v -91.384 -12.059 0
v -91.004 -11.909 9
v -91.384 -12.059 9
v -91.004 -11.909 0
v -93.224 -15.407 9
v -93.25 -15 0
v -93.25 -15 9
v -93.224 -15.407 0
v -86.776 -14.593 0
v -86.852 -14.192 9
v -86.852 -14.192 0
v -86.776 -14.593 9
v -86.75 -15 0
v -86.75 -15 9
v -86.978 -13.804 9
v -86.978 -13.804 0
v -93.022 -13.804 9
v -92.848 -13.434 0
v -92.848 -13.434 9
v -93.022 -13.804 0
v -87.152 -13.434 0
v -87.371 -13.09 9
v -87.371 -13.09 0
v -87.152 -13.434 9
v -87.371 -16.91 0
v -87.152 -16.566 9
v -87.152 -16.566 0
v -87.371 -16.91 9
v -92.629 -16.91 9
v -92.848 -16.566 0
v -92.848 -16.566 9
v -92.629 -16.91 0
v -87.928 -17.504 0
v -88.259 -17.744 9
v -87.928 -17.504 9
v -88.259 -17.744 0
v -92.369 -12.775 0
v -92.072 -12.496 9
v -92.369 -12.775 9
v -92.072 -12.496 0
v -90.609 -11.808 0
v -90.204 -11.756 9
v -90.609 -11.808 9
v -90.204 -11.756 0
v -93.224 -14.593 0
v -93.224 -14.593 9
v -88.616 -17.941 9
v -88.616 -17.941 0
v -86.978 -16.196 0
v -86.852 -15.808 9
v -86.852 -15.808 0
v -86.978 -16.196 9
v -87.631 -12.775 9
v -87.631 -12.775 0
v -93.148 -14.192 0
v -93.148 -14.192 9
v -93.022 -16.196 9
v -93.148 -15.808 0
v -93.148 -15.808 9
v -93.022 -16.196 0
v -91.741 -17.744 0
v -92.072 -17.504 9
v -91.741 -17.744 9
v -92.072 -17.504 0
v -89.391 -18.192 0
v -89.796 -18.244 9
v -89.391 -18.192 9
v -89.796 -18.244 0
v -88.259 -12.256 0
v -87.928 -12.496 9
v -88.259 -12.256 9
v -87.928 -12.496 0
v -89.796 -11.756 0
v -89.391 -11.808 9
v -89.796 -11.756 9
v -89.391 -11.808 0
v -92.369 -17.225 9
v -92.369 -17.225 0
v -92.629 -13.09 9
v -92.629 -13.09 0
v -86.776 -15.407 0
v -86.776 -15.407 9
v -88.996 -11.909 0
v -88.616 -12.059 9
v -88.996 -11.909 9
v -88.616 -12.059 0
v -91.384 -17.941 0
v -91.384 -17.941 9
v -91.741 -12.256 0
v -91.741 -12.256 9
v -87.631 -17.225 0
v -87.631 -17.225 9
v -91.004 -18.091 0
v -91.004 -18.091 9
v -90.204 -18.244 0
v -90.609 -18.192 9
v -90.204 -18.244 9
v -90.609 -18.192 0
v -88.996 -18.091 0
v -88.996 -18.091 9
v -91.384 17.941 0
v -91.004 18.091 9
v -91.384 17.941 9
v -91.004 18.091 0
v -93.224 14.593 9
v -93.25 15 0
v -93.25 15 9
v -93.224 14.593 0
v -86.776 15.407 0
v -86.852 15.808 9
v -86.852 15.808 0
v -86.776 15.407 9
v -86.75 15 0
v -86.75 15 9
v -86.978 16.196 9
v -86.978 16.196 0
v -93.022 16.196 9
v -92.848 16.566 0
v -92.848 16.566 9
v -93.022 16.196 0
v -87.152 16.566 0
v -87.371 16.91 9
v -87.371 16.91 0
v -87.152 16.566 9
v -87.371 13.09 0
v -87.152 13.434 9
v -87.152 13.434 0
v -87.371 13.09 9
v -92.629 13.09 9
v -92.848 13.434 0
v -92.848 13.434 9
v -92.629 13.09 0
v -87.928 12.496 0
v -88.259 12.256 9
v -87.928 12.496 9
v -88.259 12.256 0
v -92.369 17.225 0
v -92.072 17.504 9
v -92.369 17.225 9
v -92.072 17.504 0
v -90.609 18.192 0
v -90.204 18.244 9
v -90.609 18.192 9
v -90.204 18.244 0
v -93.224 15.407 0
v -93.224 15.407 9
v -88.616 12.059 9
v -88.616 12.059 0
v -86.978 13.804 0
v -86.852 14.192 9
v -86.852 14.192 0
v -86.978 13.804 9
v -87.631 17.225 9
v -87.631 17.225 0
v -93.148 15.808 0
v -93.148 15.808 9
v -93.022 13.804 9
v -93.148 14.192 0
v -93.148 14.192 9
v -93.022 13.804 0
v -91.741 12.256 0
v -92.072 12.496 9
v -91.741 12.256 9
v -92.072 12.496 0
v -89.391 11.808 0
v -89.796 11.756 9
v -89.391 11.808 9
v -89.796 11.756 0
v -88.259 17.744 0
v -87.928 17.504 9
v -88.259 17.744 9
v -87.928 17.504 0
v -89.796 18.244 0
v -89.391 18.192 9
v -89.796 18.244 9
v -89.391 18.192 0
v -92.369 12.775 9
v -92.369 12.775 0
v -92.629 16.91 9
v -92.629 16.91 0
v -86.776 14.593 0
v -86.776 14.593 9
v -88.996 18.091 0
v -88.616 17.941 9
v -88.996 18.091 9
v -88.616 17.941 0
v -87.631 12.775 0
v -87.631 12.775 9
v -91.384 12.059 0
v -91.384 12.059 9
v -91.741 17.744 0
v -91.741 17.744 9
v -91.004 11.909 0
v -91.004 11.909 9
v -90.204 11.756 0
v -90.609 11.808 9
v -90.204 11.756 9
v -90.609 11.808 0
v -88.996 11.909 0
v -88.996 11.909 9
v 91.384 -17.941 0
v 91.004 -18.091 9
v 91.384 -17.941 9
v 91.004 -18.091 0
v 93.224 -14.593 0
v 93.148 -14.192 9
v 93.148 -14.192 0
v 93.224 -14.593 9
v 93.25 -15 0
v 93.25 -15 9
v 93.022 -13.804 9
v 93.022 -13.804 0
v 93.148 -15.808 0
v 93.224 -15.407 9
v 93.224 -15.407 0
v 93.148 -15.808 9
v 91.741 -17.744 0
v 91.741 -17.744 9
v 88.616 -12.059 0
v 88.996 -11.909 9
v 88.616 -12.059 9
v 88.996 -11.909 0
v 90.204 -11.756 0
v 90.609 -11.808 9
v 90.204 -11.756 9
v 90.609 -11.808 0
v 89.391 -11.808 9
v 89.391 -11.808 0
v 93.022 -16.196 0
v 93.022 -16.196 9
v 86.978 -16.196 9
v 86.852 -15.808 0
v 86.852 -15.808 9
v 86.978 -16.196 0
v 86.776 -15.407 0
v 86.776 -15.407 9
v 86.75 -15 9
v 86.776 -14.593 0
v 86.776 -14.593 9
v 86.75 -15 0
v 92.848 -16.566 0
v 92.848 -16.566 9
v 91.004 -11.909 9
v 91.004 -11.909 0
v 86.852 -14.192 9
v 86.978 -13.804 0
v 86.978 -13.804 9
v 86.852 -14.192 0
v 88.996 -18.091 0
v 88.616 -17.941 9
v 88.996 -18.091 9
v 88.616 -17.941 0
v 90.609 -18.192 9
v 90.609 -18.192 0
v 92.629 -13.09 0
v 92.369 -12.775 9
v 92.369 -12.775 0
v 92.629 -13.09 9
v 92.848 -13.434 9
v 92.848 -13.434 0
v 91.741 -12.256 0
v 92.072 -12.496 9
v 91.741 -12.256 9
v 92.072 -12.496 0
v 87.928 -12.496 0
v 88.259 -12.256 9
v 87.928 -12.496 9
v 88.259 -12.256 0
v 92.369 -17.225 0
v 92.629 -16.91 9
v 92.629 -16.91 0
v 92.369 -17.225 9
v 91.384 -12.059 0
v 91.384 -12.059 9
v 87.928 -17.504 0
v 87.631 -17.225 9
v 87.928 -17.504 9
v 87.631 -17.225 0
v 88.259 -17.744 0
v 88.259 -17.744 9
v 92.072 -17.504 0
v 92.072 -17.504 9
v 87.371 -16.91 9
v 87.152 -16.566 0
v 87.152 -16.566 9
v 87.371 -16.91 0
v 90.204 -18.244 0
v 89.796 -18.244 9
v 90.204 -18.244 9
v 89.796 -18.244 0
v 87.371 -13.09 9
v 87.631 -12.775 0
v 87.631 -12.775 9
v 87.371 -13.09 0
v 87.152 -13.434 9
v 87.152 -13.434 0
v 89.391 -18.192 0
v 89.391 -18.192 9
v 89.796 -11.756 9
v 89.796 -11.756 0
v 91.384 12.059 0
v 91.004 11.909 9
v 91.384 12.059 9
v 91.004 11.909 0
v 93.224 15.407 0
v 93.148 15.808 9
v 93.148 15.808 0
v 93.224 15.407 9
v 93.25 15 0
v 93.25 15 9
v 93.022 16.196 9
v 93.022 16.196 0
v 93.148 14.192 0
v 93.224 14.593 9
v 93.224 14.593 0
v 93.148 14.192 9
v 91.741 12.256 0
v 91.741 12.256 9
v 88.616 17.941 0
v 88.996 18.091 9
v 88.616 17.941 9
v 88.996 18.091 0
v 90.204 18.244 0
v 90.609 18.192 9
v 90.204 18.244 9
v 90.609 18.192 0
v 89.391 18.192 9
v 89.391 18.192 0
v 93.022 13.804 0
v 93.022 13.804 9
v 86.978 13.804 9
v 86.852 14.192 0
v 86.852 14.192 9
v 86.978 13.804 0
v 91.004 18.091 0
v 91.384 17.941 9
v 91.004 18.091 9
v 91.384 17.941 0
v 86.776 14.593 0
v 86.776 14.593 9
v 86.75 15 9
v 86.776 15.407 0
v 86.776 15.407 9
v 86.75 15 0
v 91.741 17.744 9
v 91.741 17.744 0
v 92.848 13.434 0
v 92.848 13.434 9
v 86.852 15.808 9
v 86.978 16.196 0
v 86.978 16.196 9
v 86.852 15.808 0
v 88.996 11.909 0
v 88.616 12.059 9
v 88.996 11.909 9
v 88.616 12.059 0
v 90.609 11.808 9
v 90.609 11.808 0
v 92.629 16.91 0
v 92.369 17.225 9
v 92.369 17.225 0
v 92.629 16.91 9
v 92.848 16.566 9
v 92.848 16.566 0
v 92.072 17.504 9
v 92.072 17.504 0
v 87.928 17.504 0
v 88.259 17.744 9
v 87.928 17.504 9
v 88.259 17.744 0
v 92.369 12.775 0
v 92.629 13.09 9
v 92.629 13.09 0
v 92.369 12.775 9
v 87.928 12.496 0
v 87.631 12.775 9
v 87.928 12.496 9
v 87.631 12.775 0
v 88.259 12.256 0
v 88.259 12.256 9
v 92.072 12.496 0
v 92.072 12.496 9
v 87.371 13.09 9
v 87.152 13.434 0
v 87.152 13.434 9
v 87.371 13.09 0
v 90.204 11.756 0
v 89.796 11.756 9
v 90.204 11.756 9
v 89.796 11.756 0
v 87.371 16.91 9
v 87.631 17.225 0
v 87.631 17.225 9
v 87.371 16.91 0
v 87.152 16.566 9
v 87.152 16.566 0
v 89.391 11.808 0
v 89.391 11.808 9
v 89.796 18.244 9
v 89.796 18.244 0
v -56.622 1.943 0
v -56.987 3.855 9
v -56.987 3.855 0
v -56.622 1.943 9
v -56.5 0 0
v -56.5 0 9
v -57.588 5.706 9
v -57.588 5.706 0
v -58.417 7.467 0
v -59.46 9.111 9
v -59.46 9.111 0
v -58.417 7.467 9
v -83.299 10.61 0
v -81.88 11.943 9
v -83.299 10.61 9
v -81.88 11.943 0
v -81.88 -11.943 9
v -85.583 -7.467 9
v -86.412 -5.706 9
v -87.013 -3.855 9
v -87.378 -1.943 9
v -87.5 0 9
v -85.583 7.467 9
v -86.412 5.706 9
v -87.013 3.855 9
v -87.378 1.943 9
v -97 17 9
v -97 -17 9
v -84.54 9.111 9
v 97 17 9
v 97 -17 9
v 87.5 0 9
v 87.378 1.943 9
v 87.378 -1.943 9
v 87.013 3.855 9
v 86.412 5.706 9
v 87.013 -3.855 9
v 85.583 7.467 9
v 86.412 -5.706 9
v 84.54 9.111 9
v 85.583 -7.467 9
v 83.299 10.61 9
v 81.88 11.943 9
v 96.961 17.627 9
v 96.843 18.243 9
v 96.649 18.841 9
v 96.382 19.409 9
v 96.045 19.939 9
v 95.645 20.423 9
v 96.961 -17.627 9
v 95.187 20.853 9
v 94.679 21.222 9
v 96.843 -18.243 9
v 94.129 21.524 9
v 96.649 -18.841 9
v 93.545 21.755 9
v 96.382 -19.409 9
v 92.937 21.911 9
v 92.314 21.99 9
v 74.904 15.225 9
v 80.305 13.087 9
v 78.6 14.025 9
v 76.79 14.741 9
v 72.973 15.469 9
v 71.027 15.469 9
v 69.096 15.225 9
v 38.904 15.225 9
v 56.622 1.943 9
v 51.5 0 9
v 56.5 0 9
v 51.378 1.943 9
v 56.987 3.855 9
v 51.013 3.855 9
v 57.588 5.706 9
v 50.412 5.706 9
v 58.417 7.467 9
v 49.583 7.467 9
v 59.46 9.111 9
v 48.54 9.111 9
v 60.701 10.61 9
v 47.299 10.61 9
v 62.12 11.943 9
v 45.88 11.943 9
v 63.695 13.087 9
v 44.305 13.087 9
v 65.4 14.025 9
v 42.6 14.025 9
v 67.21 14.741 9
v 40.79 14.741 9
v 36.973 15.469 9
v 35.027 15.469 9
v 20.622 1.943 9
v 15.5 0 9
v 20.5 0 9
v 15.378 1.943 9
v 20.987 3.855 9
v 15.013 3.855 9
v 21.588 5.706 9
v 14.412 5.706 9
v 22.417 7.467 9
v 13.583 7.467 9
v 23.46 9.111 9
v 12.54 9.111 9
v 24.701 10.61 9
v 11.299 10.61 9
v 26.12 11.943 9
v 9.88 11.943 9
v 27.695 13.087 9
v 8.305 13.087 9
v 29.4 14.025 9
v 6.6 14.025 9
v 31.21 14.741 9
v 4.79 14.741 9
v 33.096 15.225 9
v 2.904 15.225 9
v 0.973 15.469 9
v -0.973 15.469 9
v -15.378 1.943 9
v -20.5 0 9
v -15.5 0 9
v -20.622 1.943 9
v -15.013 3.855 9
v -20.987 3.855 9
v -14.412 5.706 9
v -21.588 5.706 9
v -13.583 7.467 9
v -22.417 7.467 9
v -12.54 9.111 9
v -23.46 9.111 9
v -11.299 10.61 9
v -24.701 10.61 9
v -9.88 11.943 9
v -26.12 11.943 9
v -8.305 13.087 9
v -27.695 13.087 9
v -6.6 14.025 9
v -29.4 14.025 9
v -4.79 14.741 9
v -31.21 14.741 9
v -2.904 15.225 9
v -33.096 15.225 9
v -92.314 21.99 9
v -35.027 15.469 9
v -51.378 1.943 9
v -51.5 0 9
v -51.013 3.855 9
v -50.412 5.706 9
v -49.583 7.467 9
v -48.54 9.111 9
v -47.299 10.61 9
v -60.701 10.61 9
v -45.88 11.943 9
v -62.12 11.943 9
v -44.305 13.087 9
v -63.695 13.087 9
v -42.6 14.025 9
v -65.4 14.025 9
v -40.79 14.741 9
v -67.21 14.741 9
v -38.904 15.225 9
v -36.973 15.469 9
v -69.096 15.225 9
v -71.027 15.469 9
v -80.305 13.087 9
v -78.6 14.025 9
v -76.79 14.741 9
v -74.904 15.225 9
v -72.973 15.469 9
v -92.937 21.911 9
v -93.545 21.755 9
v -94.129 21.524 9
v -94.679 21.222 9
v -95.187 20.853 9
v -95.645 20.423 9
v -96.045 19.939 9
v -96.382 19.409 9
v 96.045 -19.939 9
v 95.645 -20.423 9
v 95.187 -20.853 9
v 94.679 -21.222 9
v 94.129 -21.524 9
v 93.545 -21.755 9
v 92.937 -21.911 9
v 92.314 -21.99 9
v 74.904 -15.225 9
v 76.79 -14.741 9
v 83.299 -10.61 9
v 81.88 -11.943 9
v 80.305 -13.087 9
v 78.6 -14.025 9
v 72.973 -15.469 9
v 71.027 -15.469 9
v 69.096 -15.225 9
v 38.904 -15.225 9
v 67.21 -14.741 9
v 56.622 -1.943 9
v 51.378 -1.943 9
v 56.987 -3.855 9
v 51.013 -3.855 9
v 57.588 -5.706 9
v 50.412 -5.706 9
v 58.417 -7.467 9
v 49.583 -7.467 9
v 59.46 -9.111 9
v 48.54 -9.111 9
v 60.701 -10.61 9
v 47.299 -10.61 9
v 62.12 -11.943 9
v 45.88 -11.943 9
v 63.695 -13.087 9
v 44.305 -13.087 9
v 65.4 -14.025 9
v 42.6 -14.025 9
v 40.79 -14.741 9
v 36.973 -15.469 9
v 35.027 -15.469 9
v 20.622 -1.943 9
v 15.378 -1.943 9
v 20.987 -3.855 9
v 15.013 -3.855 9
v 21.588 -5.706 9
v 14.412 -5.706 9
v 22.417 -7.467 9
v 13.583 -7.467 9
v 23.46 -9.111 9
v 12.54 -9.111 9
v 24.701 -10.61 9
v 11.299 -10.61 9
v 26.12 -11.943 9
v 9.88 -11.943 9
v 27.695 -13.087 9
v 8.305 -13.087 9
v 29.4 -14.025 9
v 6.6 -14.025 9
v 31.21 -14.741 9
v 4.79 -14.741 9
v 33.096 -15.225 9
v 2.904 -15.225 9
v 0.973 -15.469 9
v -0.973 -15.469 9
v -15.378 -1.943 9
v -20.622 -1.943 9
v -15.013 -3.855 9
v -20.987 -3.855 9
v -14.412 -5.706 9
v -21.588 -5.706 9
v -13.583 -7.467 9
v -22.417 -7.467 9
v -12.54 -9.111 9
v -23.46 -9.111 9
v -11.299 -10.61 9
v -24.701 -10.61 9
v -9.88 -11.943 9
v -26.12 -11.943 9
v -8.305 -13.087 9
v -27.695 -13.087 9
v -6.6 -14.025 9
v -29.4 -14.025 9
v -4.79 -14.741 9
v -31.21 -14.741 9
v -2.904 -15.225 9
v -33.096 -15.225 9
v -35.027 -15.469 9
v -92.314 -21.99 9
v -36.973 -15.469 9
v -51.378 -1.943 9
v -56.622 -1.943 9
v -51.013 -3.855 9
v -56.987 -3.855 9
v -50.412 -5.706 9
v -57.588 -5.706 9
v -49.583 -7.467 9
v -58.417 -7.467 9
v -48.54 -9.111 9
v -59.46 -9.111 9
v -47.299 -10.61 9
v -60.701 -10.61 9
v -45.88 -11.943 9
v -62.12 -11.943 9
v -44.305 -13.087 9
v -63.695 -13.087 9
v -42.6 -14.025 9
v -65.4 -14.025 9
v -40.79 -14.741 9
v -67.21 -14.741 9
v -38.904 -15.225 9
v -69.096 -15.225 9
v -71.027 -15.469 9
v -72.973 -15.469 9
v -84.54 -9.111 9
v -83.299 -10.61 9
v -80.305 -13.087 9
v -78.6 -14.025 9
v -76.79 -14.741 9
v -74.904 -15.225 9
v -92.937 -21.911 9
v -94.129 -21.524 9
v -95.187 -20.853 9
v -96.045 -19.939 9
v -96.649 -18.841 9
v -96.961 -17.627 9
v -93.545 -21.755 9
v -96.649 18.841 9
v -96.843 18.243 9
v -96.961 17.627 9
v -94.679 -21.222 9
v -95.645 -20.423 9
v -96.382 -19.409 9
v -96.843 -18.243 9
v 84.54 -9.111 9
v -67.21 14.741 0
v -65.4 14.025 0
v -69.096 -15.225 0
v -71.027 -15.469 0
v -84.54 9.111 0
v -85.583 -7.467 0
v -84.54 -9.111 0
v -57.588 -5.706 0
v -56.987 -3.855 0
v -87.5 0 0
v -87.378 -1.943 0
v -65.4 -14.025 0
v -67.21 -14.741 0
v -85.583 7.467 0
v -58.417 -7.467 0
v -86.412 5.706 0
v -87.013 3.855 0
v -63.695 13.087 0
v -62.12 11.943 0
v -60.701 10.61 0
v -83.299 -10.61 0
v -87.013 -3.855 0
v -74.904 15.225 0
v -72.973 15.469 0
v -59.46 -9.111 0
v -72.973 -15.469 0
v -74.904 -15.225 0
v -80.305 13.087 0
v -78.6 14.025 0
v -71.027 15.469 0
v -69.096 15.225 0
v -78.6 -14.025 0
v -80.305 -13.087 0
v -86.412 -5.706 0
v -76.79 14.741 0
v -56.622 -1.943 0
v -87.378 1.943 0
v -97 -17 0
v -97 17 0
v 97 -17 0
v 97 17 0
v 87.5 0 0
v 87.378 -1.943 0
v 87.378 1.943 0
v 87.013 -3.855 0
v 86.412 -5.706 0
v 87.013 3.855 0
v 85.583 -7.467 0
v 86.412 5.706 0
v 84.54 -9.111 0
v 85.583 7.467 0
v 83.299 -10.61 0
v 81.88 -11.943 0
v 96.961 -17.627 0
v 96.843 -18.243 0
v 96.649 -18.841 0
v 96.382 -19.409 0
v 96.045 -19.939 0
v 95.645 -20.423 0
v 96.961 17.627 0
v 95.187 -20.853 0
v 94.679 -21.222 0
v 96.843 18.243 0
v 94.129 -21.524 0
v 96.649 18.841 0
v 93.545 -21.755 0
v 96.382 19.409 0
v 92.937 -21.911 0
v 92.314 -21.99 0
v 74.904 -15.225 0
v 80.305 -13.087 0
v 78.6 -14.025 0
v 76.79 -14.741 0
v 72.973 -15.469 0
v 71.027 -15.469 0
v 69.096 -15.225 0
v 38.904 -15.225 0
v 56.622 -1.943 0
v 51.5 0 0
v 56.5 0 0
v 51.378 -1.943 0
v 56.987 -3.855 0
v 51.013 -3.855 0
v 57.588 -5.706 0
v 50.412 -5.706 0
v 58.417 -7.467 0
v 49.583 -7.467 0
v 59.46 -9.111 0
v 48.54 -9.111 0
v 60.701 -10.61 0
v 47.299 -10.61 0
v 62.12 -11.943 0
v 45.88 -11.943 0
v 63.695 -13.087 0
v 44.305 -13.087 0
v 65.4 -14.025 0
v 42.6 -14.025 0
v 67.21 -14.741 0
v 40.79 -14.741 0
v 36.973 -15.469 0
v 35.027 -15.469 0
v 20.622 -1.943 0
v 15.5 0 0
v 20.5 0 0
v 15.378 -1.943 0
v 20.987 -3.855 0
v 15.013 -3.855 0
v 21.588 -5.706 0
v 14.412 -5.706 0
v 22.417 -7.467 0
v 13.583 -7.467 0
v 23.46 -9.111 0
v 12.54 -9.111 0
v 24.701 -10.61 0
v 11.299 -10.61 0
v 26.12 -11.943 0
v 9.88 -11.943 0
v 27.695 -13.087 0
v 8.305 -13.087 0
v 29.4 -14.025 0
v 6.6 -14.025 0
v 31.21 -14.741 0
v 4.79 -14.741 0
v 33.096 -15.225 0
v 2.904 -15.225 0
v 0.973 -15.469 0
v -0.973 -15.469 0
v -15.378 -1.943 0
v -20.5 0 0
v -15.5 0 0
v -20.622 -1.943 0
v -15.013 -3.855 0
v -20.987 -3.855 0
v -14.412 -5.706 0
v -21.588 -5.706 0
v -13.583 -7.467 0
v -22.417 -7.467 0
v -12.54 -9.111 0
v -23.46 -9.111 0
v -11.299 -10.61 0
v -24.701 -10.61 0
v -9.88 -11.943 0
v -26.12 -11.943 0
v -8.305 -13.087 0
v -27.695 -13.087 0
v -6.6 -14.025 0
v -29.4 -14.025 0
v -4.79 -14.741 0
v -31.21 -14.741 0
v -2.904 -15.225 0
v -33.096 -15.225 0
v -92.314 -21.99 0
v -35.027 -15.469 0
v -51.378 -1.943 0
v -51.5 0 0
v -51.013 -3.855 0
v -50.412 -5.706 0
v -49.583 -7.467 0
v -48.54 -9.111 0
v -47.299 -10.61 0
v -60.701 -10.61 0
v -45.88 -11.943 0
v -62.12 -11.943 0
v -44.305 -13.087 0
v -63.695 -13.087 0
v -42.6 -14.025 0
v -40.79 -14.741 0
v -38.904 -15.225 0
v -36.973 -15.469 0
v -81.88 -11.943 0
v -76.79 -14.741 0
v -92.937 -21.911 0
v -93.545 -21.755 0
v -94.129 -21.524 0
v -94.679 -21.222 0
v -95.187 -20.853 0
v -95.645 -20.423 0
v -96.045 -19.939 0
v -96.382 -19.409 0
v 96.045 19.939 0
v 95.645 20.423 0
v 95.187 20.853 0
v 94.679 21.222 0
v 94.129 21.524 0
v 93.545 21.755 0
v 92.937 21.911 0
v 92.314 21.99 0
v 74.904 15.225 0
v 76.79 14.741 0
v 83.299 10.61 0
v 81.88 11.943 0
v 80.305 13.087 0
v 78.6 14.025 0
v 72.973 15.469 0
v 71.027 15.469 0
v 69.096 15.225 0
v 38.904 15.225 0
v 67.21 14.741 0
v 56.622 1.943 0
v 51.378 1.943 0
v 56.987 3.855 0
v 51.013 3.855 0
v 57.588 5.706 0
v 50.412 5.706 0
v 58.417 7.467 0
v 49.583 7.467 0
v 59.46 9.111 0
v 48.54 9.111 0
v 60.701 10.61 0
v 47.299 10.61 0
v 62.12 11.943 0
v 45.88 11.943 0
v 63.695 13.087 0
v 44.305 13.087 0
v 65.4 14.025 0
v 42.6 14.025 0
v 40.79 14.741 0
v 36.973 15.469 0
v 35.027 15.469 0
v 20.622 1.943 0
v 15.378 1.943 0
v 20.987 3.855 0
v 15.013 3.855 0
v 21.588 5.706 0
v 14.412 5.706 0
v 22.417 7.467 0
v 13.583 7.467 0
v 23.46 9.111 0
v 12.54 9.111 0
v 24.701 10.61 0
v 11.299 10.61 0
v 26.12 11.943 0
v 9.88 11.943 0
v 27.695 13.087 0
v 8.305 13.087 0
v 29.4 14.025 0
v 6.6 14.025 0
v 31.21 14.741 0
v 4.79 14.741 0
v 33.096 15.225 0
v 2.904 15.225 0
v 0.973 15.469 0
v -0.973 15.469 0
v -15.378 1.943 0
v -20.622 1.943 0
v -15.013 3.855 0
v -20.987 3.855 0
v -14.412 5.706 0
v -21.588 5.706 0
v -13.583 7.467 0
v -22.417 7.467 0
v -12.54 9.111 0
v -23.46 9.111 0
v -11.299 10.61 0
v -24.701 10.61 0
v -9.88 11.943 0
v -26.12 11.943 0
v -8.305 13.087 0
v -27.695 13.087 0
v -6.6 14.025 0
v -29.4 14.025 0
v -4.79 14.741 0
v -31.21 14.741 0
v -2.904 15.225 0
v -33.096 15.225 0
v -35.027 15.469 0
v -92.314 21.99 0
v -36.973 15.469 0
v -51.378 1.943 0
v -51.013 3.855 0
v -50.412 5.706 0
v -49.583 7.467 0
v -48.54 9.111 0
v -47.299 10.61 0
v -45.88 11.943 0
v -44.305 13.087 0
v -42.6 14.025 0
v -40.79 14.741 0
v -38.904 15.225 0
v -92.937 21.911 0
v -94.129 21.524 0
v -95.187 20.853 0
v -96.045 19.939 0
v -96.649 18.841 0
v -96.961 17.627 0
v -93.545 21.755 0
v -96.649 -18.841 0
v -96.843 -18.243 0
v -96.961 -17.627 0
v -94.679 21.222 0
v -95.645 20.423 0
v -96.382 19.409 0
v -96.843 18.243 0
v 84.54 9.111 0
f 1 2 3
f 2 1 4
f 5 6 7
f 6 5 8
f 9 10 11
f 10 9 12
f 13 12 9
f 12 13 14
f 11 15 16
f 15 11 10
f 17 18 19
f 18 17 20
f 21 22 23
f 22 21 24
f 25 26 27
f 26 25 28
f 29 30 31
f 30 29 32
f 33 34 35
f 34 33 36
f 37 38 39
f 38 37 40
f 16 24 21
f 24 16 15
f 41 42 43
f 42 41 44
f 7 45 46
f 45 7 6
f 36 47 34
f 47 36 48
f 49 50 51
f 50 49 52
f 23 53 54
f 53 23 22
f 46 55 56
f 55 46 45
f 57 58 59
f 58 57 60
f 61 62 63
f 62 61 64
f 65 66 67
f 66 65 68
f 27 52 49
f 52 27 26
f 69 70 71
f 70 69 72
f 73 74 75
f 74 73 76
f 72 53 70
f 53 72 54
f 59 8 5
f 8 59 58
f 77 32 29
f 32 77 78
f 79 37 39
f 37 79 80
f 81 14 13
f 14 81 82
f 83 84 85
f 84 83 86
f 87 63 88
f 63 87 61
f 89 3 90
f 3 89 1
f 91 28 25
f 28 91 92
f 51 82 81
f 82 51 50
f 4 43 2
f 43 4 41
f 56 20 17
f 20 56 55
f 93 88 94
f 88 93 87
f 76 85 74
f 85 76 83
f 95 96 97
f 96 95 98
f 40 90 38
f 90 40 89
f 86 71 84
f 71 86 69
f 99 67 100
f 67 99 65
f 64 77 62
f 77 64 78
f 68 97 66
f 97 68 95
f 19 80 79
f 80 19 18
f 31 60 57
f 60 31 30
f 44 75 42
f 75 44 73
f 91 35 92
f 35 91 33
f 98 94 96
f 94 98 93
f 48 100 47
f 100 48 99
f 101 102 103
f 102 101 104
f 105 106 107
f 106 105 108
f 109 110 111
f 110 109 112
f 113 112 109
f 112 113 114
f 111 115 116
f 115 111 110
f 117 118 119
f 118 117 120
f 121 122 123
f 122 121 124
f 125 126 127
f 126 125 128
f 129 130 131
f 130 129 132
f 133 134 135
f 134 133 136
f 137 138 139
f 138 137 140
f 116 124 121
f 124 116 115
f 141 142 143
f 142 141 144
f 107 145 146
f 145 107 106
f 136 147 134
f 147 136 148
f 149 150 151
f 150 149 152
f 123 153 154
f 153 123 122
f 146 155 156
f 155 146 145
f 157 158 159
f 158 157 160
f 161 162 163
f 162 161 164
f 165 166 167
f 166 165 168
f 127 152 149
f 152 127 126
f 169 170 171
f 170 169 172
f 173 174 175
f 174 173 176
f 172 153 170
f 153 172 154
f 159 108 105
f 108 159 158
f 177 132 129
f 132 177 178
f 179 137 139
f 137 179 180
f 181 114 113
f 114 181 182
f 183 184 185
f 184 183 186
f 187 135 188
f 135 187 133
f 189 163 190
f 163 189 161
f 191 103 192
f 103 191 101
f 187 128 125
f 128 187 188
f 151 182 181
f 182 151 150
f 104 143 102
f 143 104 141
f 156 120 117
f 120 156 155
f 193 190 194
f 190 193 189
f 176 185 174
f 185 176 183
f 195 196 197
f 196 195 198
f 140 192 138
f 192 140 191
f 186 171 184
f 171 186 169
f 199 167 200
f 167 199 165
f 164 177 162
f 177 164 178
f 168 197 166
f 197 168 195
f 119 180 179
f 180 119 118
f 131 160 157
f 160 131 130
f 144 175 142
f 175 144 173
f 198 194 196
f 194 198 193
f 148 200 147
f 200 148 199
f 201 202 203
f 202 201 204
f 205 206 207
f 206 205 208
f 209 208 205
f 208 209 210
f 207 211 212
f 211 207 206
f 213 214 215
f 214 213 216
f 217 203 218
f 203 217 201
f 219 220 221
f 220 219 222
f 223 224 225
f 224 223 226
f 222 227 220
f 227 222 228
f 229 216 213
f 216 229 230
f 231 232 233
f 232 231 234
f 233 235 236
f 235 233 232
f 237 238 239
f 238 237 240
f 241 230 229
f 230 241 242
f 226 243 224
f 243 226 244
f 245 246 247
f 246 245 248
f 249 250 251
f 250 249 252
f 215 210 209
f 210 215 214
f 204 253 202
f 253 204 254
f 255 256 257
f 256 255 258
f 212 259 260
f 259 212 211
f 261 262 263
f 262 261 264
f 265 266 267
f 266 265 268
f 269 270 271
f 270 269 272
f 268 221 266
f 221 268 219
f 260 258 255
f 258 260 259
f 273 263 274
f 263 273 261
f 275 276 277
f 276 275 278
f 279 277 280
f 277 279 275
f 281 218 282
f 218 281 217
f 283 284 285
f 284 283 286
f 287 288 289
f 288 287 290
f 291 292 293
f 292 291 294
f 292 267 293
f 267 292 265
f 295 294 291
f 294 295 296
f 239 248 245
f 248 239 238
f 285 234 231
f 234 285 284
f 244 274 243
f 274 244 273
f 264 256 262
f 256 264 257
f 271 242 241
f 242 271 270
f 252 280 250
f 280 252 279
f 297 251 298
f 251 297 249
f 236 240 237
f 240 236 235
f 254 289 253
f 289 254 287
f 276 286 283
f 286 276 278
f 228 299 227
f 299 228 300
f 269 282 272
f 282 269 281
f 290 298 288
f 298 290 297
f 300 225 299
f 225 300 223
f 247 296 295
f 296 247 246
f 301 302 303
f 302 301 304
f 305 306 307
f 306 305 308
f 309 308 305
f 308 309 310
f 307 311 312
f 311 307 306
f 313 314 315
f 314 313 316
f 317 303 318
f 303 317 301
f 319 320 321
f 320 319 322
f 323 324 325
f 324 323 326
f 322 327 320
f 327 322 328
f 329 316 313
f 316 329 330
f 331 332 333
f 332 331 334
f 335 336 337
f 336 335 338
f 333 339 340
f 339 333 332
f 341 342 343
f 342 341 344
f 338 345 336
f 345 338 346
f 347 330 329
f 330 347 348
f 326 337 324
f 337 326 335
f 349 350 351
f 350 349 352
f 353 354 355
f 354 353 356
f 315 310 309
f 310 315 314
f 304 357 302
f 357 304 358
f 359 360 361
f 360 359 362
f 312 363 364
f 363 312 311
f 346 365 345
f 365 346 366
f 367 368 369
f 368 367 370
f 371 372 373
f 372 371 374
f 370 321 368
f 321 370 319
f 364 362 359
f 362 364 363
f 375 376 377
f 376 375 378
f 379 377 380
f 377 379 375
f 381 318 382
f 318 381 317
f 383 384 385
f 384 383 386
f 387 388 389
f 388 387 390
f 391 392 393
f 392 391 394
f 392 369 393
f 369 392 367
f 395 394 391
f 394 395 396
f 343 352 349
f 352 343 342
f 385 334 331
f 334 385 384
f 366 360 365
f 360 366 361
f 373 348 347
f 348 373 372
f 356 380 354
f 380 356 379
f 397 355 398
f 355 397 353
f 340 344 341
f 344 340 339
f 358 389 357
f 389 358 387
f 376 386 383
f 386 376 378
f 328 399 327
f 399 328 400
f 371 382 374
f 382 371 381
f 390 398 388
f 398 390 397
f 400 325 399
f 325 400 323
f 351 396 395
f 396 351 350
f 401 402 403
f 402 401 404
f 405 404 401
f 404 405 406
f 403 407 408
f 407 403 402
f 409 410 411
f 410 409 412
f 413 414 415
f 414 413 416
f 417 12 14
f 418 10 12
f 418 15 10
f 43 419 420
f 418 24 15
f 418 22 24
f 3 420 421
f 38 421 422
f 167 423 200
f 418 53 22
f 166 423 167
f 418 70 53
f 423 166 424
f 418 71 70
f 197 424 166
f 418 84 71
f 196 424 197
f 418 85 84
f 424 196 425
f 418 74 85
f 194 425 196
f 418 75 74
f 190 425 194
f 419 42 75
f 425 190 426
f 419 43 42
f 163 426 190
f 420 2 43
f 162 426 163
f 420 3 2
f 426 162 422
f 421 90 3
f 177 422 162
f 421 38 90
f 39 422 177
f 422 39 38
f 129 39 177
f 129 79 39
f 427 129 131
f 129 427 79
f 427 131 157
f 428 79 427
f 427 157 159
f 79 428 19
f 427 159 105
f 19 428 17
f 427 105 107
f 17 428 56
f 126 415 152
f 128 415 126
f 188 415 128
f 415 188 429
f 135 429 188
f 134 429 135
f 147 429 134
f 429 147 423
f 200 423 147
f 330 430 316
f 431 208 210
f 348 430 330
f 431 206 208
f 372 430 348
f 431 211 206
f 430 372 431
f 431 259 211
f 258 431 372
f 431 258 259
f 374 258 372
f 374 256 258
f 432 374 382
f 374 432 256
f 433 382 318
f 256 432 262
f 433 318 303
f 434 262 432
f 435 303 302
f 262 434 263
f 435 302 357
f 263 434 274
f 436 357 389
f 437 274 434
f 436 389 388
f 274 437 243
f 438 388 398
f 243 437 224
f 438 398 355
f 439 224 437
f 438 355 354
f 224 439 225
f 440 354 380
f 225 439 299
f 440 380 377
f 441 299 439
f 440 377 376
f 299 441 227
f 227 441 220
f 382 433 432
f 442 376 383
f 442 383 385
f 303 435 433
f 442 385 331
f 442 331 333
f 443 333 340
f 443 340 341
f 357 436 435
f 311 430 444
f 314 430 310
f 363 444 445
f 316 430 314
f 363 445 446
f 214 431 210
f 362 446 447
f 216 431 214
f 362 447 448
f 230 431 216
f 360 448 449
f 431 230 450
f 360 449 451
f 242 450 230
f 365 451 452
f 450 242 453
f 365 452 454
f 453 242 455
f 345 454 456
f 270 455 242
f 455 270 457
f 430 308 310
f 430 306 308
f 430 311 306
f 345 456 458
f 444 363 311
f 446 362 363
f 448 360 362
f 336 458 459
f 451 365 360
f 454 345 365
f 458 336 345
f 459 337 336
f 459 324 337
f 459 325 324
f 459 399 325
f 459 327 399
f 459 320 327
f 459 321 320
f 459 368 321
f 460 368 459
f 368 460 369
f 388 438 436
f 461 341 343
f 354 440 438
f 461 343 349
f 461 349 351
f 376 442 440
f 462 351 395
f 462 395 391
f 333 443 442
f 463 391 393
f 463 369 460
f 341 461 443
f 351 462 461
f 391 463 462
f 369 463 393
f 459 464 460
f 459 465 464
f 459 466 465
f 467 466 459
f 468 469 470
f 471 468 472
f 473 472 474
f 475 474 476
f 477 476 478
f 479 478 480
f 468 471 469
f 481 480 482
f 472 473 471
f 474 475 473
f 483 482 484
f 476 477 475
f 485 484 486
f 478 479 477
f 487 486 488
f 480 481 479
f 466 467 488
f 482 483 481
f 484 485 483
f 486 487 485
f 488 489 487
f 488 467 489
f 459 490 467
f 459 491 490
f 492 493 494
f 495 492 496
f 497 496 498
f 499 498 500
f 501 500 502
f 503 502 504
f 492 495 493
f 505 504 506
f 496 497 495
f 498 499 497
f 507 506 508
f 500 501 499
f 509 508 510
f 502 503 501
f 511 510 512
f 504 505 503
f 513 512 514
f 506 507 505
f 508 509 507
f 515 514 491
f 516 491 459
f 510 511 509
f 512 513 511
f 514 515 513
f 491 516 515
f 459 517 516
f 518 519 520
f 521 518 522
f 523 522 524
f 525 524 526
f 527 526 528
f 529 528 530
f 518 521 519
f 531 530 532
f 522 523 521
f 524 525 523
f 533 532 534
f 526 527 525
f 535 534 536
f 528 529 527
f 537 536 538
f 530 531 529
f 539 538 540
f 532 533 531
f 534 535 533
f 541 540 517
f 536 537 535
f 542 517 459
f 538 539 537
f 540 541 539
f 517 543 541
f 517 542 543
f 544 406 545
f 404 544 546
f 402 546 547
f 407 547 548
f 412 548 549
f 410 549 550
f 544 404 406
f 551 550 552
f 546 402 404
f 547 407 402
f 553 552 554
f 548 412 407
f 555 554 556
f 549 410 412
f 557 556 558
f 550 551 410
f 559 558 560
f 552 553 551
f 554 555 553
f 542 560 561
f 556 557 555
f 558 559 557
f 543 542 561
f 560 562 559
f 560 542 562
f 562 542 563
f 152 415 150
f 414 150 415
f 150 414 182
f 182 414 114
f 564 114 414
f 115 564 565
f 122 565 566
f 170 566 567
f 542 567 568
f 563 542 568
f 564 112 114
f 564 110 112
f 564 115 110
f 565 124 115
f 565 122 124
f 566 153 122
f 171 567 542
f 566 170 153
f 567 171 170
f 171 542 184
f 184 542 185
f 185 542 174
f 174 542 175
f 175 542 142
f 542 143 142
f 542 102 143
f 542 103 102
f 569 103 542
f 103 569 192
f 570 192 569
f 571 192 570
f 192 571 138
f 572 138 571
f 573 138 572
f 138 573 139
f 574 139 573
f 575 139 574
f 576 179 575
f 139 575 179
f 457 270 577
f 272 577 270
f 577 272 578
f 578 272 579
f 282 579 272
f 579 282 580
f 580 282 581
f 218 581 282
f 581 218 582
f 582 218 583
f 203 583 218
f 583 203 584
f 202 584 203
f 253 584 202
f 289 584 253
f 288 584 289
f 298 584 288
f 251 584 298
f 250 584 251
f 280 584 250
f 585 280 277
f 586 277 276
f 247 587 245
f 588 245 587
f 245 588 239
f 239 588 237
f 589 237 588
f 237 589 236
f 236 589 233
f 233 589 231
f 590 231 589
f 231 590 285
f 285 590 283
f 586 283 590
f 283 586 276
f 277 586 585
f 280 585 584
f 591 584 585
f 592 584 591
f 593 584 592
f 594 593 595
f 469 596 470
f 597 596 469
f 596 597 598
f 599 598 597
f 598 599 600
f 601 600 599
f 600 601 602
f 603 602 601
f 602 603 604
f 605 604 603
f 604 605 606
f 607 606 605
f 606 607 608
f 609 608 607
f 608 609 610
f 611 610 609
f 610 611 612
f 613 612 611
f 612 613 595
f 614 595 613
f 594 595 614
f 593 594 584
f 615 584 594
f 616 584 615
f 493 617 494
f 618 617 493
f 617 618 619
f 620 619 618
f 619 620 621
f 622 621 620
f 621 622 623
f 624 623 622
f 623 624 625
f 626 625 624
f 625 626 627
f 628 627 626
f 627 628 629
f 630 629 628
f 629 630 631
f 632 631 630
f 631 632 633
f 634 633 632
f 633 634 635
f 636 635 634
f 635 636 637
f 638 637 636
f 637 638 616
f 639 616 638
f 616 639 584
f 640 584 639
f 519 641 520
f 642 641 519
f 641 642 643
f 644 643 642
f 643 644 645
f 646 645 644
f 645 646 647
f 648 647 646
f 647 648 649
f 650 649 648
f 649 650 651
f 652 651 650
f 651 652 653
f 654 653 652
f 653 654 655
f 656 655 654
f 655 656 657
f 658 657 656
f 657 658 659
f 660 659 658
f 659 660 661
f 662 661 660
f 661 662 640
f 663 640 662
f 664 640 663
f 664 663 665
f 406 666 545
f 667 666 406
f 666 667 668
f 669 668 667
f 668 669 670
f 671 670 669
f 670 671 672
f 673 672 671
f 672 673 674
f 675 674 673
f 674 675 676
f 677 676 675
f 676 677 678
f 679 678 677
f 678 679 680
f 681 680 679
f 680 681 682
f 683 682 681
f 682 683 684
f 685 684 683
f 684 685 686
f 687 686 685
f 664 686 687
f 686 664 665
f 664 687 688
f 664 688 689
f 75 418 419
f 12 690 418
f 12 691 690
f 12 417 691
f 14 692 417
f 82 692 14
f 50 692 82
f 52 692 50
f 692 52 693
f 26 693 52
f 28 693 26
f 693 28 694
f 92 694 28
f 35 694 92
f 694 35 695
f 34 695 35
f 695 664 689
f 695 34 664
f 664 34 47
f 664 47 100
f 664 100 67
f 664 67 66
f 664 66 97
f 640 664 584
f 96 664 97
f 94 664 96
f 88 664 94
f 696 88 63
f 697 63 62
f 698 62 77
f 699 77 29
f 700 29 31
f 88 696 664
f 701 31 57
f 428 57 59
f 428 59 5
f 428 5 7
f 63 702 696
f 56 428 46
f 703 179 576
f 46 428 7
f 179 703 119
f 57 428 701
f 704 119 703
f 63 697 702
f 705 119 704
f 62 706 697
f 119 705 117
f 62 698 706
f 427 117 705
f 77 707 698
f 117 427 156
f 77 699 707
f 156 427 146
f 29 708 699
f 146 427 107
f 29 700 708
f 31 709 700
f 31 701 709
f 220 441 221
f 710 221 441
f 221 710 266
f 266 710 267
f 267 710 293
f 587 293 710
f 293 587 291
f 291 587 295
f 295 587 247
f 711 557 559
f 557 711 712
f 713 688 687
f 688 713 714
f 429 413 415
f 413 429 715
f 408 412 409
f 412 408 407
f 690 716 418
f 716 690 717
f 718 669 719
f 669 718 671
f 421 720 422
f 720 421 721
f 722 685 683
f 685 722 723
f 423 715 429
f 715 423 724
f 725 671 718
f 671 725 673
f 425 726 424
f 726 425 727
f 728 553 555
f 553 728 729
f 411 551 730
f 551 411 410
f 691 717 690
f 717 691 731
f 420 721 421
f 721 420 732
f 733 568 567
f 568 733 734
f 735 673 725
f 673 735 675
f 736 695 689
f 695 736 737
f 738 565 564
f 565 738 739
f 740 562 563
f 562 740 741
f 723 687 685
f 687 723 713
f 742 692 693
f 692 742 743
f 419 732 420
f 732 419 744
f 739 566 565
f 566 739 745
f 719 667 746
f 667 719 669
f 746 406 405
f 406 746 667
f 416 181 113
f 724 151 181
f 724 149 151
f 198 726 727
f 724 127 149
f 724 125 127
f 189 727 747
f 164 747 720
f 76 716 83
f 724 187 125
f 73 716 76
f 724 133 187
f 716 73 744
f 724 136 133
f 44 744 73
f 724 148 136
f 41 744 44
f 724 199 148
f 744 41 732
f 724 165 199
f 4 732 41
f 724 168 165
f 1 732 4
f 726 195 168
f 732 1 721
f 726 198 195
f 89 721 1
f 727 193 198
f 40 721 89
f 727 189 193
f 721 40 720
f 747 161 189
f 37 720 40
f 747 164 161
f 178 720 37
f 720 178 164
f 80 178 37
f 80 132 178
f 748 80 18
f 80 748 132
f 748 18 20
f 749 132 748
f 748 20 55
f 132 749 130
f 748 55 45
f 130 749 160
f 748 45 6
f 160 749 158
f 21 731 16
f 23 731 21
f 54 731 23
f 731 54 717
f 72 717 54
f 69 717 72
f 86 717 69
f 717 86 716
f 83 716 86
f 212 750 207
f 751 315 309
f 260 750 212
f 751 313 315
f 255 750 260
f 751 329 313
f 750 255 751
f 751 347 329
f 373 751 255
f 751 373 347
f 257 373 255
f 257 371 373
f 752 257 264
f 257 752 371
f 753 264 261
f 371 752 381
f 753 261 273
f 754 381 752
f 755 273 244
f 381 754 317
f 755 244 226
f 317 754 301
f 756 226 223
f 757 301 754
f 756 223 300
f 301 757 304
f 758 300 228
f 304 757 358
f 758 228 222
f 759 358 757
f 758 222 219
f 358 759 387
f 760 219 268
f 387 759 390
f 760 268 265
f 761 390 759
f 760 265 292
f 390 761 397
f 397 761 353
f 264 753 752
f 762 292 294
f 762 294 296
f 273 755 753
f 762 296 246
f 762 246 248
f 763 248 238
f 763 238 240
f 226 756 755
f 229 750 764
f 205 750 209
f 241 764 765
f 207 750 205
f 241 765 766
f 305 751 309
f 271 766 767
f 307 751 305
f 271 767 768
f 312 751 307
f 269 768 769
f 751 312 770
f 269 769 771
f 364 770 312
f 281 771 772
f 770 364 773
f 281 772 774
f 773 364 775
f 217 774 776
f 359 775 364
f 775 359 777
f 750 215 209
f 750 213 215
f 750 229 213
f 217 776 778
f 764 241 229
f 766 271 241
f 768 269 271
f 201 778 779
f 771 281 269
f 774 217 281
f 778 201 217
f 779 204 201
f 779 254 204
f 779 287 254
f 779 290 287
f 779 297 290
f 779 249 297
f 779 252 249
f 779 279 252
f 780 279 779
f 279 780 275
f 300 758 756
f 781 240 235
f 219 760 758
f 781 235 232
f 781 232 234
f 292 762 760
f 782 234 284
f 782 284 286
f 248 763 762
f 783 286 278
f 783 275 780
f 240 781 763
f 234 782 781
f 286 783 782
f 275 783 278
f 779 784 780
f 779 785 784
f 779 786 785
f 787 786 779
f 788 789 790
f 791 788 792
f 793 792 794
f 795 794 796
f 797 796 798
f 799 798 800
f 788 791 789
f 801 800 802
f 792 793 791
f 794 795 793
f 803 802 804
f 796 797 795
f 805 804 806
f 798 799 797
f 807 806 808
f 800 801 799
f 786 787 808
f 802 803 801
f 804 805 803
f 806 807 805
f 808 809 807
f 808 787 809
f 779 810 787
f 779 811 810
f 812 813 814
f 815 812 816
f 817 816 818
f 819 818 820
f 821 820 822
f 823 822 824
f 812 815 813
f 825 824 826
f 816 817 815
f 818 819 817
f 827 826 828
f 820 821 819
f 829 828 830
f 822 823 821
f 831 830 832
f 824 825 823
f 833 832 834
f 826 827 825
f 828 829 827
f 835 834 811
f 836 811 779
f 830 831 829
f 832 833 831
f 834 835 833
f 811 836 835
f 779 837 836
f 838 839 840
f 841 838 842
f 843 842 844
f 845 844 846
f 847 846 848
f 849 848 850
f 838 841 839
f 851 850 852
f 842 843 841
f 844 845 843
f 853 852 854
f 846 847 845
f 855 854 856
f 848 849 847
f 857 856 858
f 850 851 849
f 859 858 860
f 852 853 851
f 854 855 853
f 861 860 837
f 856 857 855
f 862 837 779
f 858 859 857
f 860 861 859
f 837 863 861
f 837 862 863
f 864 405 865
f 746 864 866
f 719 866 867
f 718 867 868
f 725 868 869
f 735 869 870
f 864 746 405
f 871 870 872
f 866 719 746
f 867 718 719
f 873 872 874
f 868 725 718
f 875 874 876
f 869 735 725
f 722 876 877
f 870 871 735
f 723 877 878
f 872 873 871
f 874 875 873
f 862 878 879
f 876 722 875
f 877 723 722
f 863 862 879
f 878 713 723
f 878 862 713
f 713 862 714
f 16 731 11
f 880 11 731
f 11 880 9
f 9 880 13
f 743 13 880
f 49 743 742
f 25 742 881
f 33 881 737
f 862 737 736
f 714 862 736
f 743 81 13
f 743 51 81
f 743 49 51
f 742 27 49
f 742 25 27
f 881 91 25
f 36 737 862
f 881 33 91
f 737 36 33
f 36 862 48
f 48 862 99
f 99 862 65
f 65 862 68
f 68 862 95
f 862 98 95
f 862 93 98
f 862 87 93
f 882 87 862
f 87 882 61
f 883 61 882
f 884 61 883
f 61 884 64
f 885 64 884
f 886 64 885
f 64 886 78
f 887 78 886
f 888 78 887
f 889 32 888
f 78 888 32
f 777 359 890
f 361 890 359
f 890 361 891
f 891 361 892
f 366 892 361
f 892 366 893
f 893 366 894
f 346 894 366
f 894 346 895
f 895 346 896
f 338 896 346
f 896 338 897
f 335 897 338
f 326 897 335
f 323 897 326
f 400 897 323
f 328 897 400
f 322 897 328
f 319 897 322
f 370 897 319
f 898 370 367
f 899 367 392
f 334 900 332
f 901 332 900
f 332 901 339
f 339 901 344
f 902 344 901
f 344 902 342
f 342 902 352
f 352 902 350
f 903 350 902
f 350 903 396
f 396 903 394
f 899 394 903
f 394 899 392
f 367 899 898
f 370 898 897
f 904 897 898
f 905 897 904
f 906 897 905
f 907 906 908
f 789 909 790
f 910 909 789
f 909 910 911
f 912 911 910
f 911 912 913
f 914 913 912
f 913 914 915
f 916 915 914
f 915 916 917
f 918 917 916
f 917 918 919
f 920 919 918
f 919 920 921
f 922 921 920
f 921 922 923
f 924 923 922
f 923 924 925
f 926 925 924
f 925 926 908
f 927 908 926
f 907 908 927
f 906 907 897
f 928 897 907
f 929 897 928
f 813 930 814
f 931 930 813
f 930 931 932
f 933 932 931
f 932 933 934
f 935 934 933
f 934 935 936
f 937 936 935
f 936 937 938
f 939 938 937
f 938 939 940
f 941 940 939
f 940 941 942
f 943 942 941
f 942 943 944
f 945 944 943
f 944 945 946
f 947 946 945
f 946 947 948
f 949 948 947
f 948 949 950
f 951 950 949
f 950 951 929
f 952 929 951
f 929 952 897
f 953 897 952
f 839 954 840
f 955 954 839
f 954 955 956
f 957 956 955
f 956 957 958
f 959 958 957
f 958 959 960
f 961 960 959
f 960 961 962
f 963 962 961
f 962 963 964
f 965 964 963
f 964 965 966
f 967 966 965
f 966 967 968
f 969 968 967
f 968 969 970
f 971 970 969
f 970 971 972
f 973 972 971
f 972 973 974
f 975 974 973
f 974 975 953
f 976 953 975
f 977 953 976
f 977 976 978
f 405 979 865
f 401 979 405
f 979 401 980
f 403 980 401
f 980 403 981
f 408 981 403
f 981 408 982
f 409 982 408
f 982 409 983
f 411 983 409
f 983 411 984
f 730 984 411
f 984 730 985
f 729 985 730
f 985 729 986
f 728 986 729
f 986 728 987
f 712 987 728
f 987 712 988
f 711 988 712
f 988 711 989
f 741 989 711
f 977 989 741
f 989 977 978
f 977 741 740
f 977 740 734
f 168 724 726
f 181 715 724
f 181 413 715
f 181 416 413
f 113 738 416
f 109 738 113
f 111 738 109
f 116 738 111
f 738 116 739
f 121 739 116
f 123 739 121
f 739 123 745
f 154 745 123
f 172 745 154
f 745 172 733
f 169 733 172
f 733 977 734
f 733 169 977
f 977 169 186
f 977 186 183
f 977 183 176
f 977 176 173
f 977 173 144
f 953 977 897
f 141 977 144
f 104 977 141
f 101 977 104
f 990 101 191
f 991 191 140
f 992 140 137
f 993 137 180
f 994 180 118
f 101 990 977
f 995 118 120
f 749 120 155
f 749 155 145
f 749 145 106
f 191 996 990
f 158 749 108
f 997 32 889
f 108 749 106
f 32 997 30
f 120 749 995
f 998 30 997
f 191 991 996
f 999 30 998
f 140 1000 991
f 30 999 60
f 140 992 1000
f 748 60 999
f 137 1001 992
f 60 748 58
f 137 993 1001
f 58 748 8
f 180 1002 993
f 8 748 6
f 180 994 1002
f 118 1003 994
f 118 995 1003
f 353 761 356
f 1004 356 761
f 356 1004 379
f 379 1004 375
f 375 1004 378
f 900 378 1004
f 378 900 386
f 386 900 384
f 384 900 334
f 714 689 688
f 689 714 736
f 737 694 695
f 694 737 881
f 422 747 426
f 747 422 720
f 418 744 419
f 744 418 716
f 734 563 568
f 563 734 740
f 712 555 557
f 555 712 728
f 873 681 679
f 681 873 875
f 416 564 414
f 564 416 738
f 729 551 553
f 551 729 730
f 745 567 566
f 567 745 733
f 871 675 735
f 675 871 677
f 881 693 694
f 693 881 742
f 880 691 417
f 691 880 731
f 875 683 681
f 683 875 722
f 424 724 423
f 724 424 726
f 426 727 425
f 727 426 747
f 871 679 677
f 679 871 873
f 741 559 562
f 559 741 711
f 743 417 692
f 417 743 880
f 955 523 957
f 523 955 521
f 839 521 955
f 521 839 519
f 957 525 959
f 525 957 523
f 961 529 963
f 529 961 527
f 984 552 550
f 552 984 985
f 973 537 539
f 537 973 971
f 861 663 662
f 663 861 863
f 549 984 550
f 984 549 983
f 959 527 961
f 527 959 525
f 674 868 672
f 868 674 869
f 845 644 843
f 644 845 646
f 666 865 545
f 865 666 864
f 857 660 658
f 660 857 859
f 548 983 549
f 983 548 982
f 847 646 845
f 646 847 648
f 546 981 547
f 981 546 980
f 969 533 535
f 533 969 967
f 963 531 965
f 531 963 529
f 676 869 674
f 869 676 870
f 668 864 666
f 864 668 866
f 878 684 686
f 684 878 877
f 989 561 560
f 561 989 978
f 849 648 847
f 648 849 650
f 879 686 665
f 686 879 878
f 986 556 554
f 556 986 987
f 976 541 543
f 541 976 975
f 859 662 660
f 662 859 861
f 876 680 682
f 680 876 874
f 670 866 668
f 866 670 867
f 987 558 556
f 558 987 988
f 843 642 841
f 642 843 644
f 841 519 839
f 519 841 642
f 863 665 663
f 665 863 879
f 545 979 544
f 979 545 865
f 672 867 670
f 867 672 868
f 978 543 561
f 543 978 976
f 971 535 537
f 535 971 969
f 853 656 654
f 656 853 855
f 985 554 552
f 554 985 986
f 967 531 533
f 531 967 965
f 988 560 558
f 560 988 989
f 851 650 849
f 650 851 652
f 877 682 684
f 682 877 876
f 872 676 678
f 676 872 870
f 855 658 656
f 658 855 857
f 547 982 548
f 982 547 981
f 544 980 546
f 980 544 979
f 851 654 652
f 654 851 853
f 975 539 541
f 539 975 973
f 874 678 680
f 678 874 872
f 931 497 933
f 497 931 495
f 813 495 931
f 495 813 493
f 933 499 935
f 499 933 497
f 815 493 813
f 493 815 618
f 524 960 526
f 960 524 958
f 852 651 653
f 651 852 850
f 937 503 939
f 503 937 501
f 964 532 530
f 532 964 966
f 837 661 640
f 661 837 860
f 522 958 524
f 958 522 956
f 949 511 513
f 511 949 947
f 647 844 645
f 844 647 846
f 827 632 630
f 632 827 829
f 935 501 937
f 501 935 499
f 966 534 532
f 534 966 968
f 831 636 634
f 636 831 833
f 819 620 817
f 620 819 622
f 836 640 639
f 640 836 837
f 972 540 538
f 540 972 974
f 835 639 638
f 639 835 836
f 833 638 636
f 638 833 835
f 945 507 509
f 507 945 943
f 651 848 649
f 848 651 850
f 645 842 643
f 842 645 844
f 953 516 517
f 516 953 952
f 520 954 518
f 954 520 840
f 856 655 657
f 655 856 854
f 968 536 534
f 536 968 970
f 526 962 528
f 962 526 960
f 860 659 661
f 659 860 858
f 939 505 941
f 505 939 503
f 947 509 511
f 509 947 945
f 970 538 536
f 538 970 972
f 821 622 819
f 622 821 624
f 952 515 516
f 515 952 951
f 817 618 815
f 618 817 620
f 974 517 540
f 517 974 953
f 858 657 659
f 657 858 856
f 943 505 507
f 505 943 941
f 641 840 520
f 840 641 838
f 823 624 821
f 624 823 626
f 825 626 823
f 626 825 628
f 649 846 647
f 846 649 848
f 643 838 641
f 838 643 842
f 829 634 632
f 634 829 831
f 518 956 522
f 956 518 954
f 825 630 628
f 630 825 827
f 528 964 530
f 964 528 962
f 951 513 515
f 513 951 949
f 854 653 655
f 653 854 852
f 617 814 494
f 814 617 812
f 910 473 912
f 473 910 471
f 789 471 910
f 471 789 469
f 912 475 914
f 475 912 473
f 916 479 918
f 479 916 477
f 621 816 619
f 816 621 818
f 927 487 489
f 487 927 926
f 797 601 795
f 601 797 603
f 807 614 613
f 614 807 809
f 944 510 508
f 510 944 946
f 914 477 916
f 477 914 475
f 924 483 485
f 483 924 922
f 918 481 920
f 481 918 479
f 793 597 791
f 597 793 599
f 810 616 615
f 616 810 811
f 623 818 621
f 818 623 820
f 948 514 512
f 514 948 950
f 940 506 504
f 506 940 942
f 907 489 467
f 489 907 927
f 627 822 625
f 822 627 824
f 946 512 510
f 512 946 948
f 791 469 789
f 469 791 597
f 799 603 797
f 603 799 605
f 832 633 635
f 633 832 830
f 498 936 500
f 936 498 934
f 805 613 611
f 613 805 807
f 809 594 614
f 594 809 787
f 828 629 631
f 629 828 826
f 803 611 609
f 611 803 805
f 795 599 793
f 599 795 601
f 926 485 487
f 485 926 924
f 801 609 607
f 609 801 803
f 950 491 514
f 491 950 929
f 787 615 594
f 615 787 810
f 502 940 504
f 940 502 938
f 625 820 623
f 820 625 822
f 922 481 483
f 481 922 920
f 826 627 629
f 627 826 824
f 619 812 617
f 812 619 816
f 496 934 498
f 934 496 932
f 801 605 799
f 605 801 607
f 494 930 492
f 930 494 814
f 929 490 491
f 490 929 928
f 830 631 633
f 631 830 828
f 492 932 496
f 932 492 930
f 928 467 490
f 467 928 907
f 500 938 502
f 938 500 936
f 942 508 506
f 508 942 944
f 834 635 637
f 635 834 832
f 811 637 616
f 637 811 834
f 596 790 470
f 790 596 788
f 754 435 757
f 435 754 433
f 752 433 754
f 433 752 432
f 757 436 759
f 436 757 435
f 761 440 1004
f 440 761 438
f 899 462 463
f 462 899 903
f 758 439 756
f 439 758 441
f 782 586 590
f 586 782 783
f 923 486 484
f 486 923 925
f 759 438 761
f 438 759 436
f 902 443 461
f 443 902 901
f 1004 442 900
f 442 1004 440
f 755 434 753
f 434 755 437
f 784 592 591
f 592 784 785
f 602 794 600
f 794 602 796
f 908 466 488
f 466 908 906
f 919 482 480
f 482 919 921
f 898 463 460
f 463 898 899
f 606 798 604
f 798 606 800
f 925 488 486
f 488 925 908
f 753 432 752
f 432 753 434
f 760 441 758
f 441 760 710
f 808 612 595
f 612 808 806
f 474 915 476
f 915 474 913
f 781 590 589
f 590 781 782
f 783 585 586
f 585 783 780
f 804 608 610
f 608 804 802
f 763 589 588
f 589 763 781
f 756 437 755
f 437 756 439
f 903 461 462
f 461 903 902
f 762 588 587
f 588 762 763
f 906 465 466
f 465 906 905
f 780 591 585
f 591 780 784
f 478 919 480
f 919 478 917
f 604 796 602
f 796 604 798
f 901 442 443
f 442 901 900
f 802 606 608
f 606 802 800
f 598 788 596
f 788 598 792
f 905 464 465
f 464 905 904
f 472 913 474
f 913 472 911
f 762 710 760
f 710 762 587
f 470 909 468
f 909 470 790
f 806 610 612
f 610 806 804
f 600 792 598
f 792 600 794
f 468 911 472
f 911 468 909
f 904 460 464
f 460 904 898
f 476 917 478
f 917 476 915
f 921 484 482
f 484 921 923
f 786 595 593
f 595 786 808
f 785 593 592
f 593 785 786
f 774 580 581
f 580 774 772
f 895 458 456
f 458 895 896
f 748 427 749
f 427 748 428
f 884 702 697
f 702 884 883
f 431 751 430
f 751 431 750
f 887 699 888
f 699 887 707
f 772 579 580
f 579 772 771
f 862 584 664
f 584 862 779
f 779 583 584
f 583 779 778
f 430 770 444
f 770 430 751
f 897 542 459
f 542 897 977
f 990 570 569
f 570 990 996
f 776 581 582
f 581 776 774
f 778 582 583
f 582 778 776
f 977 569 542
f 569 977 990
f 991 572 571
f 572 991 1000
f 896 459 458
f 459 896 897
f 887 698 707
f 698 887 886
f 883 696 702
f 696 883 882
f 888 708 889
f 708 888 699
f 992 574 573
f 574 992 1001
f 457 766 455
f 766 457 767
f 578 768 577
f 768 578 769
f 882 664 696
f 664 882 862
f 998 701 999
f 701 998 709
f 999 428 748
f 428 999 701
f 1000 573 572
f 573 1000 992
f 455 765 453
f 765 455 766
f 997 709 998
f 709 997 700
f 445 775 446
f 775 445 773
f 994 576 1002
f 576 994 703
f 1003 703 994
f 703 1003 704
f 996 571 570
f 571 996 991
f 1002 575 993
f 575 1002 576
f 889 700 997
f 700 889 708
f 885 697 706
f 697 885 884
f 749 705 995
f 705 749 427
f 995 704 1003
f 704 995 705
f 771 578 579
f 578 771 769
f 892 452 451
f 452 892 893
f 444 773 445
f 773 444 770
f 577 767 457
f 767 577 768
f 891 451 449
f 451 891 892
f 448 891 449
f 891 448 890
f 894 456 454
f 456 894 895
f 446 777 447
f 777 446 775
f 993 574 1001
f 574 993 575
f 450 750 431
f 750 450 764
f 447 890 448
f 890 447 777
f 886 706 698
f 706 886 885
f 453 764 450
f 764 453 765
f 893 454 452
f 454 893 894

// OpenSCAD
$fn = 50;


difference() {
	union() {
		hull() {
			translate(v = [-92.0000000000, 17.0000000000, 0]) {
				cylinder(h = 9, r = 5);
			}
			translate(v = [92.0000000000, 17.0000000000, 0]) {
				cylinder(h = 9, r = 5);
			}
			translate(v = [-92.0000000000, -17.0000000000, 0]) {
				cylinder(h = 9, r = 5);
			}
			translate(v = [92.0000000000, -17.0000000000, 0]) {
				cylinder(h = 9, r = 5);
			}
		}
	}
	union() {
		#translate(v = [-90.0000000000, -15.0000000000, -100.0000000000]) {
			cylinder(h = 200, r = 3.2500000000);
		}
		#translate(v = [-90.0000000000, 15.0000000000, -100.0000000000]) {
			cylinder(h = 200, r = 3.2500000000);
		}
		#translate(v = [90.0000000000, -15.0000000000, -100.0000000000]) {
			cylinder(h = 200, r = 3.2500000000);
		}
		#translate(v = [90.0000000000, 15.0000000000, -100.0000000000]) {
			cylinder(h = 200, r = 3.2500000000);
		}
		#translate(v = [-72.0000000000, 0, 0]) {
			cylinder(h = 9, r = 15.5000000000);
		}
		#translate(v = [-36.0000000000, 0, 0]) {
			cylinder(h = 9, r = 15.5000000000);
		}
		#cylinder(h = 9, r = 15.5000000000);
		#translate(v = [36.0000000000, 0, 0]) {
			cylinder(h = 9, r = 15.5000000000);
		}
		#translate(v = [72.0000000000, 0, 0]) {
			cylinder(h = 9, r = 15.5000000000);
		}
	}
}
